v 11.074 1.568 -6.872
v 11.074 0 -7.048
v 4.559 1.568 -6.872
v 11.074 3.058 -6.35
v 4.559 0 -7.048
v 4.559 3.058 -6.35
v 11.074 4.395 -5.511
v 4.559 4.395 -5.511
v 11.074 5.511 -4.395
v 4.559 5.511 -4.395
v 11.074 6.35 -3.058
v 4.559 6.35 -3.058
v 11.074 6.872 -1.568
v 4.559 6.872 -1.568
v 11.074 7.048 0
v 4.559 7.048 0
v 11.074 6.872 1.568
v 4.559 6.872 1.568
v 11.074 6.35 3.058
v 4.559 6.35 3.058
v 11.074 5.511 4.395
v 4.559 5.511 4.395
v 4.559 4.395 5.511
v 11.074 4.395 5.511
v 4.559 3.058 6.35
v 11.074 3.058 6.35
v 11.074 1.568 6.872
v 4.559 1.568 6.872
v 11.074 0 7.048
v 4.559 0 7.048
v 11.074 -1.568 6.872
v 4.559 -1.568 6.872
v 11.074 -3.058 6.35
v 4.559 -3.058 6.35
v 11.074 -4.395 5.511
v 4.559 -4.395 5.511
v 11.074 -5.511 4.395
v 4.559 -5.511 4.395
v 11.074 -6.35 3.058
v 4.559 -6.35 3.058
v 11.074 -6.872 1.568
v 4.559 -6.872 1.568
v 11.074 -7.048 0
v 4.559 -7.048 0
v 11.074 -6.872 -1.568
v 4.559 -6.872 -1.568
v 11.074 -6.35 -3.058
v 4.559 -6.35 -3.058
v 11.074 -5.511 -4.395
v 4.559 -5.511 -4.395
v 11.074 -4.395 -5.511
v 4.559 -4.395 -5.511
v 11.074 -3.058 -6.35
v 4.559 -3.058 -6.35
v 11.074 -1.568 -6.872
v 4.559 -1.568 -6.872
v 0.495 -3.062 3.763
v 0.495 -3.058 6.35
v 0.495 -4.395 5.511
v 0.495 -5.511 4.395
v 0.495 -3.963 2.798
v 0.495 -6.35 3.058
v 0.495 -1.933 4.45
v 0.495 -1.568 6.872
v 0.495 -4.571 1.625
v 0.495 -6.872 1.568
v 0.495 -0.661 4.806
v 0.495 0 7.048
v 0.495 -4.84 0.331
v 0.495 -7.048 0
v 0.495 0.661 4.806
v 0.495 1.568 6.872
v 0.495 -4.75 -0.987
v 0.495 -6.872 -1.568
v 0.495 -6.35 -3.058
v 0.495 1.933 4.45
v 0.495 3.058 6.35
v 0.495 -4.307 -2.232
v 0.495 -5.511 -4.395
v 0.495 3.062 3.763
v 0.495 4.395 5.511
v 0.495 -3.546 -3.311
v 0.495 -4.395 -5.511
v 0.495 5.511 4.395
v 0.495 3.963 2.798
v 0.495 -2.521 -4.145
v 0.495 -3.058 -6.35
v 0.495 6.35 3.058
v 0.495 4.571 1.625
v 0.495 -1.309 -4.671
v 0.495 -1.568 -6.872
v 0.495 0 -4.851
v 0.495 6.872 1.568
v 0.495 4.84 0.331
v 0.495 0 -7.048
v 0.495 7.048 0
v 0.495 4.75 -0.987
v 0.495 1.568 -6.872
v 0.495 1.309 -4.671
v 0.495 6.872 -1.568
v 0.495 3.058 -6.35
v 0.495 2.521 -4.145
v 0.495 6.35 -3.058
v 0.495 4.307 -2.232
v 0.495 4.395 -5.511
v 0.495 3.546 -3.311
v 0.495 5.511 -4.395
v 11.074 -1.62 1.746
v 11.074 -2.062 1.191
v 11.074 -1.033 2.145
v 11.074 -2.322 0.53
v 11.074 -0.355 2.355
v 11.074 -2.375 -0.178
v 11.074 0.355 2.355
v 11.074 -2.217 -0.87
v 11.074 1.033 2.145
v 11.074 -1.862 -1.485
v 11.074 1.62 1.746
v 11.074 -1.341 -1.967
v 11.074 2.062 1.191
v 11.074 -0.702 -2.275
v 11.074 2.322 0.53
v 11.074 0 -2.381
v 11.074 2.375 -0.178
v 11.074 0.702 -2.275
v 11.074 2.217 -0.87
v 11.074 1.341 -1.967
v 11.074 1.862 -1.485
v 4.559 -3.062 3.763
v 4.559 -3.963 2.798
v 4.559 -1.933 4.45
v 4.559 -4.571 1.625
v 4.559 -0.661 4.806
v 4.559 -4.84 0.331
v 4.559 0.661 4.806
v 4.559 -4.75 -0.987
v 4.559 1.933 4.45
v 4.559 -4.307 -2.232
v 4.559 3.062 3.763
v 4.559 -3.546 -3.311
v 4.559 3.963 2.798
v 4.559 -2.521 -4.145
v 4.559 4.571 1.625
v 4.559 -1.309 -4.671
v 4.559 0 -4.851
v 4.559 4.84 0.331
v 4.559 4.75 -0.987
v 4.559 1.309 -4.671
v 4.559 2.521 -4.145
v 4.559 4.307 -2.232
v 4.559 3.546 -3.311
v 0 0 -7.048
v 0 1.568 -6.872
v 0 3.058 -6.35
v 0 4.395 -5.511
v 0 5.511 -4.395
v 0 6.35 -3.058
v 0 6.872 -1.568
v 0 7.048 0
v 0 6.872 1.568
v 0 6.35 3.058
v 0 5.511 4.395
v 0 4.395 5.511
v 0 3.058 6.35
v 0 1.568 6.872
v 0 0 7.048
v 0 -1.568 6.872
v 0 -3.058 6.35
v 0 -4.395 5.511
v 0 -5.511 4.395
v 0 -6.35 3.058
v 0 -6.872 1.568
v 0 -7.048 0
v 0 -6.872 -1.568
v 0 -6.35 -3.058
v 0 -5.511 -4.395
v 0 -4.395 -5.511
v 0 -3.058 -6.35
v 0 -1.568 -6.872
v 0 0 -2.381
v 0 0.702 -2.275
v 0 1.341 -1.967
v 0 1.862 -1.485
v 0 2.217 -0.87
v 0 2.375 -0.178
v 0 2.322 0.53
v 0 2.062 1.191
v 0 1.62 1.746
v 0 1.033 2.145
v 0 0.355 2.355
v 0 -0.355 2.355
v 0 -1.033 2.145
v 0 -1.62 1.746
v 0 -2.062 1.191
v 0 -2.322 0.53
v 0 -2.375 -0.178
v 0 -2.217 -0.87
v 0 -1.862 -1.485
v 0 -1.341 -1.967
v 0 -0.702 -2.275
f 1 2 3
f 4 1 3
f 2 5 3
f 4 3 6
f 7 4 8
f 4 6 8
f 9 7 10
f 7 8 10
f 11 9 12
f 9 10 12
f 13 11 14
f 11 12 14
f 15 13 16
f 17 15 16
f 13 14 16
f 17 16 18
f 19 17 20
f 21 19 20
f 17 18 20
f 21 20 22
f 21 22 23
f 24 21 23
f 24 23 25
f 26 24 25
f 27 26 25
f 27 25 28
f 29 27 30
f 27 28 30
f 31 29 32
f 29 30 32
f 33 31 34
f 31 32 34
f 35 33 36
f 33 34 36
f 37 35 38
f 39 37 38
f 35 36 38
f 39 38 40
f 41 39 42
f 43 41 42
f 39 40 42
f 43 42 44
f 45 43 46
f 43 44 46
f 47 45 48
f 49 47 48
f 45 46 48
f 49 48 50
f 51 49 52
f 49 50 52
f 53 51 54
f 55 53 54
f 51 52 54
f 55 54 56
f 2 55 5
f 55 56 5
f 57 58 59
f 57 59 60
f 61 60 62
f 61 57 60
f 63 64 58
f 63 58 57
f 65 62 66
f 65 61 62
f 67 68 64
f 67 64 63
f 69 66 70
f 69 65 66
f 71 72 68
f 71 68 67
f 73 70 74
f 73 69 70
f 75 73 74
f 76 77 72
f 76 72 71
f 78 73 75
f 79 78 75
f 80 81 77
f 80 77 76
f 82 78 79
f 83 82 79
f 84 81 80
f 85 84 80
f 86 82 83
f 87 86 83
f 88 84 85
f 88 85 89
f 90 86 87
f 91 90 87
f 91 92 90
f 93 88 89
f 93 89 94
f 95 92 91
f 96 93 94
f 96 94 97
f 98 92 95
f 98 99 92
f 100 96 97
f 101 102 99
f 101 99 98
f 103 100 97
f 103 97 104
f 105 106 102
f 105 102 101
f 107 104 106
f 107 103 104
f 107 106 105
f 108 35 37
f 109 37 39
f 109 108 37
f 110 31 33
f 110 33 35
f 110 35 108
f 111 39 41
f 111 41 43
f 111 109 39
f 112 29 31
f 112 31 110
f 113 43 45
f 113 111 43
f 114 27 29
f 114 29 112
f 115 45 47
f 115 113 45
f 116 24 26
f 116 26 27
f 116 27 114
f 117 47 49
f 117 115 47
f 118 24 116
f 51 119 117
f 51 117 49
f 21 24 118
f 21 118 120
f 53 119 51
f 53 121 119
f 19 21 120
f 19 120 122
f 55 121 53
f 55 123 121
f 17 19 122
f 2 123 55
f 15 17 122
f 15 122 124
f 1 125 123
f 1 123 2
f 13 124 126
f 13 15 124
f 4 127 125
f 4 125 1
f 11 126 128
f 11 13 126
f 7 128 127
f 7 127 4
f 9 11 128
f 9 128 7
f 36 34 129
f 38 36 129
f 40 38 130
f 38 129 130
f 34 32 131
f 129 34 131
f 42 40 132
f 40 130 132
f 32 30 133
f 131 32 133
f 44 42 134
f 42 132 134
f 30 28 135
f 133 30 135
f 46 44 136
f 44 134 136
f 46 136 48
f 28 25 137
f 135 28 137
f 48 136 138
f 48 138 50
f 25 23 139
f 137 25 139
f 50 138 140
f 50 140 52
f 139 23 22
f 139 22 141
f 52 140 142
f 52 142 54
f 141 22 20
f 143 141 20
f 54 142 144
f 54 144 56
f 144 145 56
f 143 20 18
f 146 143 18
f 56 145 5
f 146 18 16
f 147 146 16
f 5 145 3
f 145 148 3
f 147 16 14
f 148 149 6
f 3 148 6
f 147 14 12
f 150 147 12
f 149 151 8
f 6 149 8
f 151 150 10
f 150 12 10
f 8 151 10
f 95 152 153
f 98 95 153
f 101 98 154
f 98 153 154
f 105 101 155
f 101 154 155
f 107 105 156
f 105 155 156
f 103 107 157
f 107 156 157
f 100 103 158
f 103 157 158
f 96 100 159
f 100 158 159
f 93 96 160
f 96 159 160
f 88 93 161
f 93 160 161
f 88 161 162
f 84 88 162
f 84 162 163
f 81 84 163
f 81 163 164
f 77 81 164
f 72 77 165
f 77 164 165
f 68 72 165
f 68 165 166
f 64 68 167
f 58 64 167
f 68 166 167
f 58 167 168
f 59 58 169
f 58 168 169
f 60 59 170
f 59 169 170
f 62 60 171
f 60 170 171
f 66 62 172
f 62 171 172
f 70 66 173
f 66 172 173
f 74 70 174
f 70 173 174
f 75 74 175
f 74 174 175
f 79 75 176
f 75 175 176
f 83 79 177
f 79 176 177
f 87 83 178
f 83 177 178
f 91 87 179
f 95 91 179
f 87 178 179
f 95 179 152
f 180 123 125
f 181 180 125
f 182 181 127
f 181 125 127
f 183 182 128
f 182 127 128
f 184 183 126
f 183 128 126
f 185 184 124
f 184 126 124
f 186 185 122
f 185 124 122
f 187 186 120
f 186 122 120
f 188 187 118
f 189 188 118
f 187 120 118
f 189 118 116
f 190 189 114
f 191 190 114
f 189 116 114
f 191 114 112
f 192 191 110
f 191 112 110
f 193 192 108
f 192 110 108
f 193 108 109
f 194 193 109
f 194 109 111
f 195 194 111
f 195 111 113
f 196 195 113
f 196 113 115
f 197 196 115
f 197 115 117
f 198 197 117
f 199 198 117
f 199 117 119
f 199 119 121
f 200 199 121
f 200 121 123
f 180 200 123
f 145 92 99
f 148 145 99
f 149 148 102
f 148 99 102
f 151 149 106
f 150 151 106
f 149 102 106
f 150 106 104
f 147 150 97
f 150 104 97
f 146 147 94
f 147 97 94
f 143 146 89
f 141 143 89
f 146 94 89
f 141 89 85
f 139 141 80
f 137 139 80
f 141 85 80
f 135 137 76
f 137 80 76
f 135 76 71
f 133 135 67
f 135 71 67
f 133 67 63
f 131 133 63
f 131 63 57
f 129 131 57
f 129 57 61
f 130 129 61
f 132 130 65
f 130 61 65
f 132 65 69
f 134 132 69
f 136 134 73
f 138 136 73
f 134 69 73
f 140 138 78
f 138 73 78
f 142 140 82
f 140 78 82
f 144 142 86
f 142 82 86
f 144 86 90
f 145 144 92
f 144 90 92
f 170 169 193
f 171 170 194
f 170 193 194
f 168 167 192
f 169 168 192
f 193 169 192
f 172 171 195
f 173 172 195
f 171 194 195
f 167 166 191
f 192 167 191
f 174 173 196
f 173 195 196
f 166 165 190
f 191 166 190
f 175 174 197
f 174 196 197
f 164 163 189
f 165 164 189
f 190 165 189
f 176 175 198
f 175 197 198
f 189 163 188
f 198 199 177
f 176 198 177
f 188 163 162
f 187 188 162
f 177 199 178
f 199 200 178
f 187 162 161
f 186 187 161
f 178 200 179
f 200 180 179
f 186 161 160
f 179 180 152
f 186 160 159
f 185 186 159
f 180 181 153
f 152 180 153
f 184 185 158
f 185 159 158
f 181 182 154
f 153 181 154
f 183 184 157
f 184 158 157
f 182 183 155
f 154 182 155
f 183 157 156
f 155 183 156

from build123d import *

# Parameters (mm, degrees)
SKETCH1_R           = 7.0485
BOSS_EXTRUDE1_DEPTH = 0.4953
SKETCH2_R           = 4.8514
BOSS_EXTRUDE2_DEPTH = 4.064
SKETCH3_R           = 7.0485
BOSS_EXTRUDE3_DEPTH = 0.4953
SKETCH4_R           = 7.0485
BOSS_EXTRUDE4_DEPTH = 6.0198
SKETCH5_R           = 2.38125
CUT_EXTRUDE1_DEPTH  = 12.0744


with BuildPart() as part:
    # Sketch1 → Boss-Extrude1 (new body)
    with BuildSketch(Plane(origin=(0, 0, 0), x_dir=(0, 0, -1), z_dir=(1, 0, 0))):
        Circle(SKETCH1_R)
    extrude(amount=BOSS_EXTRUDE1_DEPTH)

    # Sketch2 → Boss-Extrude2 (add)
    with BuildSketch(Plane(origin=(0.4953, 0, 0), x_dir=(0, 0, -1), z_dir=(1, 0, 0))):
        Circle(SKETCH2_R)
    extrude(amount=BOSS_EXTRUDE2_DEPTH)

    # Sketch3 → Boss-Extrude3 (add)
    with BuildSketch(Plane(origin=(4.5593, 0, 0), x_dir=(0, 0, -1), z_dir=(1, 0, 0))):
        Circle(SKETCH3_R)
    extrude(amount=BOSS_EXTRUDE3_DEPTH)

    # Sketch4 → Boss-Extrude4 (add)
    with BuildSketch(Plane(origin=(5.0546, 0, 0), x_dir=(0, 0, -1), z_dir=(1, 0, 0))):
        Circle(SKETCH4_R)
    extrude(amount=BOSS_EXTRUDE4_DEPTH)

    # Sketch5 → Cut-Extrude1 (cut, through all)
    with BuildSketch(Plane(origin=(11.0744, 0, 0), x_dir=(0, 0, -1), z_dir=(1, 0, 0))):
        Circle(SKETCH5_R)
    extrude(amount=-CUT_EXTRUDE1_DEPTH, mode=Mode.SUBTRACT)


solid = part.part
